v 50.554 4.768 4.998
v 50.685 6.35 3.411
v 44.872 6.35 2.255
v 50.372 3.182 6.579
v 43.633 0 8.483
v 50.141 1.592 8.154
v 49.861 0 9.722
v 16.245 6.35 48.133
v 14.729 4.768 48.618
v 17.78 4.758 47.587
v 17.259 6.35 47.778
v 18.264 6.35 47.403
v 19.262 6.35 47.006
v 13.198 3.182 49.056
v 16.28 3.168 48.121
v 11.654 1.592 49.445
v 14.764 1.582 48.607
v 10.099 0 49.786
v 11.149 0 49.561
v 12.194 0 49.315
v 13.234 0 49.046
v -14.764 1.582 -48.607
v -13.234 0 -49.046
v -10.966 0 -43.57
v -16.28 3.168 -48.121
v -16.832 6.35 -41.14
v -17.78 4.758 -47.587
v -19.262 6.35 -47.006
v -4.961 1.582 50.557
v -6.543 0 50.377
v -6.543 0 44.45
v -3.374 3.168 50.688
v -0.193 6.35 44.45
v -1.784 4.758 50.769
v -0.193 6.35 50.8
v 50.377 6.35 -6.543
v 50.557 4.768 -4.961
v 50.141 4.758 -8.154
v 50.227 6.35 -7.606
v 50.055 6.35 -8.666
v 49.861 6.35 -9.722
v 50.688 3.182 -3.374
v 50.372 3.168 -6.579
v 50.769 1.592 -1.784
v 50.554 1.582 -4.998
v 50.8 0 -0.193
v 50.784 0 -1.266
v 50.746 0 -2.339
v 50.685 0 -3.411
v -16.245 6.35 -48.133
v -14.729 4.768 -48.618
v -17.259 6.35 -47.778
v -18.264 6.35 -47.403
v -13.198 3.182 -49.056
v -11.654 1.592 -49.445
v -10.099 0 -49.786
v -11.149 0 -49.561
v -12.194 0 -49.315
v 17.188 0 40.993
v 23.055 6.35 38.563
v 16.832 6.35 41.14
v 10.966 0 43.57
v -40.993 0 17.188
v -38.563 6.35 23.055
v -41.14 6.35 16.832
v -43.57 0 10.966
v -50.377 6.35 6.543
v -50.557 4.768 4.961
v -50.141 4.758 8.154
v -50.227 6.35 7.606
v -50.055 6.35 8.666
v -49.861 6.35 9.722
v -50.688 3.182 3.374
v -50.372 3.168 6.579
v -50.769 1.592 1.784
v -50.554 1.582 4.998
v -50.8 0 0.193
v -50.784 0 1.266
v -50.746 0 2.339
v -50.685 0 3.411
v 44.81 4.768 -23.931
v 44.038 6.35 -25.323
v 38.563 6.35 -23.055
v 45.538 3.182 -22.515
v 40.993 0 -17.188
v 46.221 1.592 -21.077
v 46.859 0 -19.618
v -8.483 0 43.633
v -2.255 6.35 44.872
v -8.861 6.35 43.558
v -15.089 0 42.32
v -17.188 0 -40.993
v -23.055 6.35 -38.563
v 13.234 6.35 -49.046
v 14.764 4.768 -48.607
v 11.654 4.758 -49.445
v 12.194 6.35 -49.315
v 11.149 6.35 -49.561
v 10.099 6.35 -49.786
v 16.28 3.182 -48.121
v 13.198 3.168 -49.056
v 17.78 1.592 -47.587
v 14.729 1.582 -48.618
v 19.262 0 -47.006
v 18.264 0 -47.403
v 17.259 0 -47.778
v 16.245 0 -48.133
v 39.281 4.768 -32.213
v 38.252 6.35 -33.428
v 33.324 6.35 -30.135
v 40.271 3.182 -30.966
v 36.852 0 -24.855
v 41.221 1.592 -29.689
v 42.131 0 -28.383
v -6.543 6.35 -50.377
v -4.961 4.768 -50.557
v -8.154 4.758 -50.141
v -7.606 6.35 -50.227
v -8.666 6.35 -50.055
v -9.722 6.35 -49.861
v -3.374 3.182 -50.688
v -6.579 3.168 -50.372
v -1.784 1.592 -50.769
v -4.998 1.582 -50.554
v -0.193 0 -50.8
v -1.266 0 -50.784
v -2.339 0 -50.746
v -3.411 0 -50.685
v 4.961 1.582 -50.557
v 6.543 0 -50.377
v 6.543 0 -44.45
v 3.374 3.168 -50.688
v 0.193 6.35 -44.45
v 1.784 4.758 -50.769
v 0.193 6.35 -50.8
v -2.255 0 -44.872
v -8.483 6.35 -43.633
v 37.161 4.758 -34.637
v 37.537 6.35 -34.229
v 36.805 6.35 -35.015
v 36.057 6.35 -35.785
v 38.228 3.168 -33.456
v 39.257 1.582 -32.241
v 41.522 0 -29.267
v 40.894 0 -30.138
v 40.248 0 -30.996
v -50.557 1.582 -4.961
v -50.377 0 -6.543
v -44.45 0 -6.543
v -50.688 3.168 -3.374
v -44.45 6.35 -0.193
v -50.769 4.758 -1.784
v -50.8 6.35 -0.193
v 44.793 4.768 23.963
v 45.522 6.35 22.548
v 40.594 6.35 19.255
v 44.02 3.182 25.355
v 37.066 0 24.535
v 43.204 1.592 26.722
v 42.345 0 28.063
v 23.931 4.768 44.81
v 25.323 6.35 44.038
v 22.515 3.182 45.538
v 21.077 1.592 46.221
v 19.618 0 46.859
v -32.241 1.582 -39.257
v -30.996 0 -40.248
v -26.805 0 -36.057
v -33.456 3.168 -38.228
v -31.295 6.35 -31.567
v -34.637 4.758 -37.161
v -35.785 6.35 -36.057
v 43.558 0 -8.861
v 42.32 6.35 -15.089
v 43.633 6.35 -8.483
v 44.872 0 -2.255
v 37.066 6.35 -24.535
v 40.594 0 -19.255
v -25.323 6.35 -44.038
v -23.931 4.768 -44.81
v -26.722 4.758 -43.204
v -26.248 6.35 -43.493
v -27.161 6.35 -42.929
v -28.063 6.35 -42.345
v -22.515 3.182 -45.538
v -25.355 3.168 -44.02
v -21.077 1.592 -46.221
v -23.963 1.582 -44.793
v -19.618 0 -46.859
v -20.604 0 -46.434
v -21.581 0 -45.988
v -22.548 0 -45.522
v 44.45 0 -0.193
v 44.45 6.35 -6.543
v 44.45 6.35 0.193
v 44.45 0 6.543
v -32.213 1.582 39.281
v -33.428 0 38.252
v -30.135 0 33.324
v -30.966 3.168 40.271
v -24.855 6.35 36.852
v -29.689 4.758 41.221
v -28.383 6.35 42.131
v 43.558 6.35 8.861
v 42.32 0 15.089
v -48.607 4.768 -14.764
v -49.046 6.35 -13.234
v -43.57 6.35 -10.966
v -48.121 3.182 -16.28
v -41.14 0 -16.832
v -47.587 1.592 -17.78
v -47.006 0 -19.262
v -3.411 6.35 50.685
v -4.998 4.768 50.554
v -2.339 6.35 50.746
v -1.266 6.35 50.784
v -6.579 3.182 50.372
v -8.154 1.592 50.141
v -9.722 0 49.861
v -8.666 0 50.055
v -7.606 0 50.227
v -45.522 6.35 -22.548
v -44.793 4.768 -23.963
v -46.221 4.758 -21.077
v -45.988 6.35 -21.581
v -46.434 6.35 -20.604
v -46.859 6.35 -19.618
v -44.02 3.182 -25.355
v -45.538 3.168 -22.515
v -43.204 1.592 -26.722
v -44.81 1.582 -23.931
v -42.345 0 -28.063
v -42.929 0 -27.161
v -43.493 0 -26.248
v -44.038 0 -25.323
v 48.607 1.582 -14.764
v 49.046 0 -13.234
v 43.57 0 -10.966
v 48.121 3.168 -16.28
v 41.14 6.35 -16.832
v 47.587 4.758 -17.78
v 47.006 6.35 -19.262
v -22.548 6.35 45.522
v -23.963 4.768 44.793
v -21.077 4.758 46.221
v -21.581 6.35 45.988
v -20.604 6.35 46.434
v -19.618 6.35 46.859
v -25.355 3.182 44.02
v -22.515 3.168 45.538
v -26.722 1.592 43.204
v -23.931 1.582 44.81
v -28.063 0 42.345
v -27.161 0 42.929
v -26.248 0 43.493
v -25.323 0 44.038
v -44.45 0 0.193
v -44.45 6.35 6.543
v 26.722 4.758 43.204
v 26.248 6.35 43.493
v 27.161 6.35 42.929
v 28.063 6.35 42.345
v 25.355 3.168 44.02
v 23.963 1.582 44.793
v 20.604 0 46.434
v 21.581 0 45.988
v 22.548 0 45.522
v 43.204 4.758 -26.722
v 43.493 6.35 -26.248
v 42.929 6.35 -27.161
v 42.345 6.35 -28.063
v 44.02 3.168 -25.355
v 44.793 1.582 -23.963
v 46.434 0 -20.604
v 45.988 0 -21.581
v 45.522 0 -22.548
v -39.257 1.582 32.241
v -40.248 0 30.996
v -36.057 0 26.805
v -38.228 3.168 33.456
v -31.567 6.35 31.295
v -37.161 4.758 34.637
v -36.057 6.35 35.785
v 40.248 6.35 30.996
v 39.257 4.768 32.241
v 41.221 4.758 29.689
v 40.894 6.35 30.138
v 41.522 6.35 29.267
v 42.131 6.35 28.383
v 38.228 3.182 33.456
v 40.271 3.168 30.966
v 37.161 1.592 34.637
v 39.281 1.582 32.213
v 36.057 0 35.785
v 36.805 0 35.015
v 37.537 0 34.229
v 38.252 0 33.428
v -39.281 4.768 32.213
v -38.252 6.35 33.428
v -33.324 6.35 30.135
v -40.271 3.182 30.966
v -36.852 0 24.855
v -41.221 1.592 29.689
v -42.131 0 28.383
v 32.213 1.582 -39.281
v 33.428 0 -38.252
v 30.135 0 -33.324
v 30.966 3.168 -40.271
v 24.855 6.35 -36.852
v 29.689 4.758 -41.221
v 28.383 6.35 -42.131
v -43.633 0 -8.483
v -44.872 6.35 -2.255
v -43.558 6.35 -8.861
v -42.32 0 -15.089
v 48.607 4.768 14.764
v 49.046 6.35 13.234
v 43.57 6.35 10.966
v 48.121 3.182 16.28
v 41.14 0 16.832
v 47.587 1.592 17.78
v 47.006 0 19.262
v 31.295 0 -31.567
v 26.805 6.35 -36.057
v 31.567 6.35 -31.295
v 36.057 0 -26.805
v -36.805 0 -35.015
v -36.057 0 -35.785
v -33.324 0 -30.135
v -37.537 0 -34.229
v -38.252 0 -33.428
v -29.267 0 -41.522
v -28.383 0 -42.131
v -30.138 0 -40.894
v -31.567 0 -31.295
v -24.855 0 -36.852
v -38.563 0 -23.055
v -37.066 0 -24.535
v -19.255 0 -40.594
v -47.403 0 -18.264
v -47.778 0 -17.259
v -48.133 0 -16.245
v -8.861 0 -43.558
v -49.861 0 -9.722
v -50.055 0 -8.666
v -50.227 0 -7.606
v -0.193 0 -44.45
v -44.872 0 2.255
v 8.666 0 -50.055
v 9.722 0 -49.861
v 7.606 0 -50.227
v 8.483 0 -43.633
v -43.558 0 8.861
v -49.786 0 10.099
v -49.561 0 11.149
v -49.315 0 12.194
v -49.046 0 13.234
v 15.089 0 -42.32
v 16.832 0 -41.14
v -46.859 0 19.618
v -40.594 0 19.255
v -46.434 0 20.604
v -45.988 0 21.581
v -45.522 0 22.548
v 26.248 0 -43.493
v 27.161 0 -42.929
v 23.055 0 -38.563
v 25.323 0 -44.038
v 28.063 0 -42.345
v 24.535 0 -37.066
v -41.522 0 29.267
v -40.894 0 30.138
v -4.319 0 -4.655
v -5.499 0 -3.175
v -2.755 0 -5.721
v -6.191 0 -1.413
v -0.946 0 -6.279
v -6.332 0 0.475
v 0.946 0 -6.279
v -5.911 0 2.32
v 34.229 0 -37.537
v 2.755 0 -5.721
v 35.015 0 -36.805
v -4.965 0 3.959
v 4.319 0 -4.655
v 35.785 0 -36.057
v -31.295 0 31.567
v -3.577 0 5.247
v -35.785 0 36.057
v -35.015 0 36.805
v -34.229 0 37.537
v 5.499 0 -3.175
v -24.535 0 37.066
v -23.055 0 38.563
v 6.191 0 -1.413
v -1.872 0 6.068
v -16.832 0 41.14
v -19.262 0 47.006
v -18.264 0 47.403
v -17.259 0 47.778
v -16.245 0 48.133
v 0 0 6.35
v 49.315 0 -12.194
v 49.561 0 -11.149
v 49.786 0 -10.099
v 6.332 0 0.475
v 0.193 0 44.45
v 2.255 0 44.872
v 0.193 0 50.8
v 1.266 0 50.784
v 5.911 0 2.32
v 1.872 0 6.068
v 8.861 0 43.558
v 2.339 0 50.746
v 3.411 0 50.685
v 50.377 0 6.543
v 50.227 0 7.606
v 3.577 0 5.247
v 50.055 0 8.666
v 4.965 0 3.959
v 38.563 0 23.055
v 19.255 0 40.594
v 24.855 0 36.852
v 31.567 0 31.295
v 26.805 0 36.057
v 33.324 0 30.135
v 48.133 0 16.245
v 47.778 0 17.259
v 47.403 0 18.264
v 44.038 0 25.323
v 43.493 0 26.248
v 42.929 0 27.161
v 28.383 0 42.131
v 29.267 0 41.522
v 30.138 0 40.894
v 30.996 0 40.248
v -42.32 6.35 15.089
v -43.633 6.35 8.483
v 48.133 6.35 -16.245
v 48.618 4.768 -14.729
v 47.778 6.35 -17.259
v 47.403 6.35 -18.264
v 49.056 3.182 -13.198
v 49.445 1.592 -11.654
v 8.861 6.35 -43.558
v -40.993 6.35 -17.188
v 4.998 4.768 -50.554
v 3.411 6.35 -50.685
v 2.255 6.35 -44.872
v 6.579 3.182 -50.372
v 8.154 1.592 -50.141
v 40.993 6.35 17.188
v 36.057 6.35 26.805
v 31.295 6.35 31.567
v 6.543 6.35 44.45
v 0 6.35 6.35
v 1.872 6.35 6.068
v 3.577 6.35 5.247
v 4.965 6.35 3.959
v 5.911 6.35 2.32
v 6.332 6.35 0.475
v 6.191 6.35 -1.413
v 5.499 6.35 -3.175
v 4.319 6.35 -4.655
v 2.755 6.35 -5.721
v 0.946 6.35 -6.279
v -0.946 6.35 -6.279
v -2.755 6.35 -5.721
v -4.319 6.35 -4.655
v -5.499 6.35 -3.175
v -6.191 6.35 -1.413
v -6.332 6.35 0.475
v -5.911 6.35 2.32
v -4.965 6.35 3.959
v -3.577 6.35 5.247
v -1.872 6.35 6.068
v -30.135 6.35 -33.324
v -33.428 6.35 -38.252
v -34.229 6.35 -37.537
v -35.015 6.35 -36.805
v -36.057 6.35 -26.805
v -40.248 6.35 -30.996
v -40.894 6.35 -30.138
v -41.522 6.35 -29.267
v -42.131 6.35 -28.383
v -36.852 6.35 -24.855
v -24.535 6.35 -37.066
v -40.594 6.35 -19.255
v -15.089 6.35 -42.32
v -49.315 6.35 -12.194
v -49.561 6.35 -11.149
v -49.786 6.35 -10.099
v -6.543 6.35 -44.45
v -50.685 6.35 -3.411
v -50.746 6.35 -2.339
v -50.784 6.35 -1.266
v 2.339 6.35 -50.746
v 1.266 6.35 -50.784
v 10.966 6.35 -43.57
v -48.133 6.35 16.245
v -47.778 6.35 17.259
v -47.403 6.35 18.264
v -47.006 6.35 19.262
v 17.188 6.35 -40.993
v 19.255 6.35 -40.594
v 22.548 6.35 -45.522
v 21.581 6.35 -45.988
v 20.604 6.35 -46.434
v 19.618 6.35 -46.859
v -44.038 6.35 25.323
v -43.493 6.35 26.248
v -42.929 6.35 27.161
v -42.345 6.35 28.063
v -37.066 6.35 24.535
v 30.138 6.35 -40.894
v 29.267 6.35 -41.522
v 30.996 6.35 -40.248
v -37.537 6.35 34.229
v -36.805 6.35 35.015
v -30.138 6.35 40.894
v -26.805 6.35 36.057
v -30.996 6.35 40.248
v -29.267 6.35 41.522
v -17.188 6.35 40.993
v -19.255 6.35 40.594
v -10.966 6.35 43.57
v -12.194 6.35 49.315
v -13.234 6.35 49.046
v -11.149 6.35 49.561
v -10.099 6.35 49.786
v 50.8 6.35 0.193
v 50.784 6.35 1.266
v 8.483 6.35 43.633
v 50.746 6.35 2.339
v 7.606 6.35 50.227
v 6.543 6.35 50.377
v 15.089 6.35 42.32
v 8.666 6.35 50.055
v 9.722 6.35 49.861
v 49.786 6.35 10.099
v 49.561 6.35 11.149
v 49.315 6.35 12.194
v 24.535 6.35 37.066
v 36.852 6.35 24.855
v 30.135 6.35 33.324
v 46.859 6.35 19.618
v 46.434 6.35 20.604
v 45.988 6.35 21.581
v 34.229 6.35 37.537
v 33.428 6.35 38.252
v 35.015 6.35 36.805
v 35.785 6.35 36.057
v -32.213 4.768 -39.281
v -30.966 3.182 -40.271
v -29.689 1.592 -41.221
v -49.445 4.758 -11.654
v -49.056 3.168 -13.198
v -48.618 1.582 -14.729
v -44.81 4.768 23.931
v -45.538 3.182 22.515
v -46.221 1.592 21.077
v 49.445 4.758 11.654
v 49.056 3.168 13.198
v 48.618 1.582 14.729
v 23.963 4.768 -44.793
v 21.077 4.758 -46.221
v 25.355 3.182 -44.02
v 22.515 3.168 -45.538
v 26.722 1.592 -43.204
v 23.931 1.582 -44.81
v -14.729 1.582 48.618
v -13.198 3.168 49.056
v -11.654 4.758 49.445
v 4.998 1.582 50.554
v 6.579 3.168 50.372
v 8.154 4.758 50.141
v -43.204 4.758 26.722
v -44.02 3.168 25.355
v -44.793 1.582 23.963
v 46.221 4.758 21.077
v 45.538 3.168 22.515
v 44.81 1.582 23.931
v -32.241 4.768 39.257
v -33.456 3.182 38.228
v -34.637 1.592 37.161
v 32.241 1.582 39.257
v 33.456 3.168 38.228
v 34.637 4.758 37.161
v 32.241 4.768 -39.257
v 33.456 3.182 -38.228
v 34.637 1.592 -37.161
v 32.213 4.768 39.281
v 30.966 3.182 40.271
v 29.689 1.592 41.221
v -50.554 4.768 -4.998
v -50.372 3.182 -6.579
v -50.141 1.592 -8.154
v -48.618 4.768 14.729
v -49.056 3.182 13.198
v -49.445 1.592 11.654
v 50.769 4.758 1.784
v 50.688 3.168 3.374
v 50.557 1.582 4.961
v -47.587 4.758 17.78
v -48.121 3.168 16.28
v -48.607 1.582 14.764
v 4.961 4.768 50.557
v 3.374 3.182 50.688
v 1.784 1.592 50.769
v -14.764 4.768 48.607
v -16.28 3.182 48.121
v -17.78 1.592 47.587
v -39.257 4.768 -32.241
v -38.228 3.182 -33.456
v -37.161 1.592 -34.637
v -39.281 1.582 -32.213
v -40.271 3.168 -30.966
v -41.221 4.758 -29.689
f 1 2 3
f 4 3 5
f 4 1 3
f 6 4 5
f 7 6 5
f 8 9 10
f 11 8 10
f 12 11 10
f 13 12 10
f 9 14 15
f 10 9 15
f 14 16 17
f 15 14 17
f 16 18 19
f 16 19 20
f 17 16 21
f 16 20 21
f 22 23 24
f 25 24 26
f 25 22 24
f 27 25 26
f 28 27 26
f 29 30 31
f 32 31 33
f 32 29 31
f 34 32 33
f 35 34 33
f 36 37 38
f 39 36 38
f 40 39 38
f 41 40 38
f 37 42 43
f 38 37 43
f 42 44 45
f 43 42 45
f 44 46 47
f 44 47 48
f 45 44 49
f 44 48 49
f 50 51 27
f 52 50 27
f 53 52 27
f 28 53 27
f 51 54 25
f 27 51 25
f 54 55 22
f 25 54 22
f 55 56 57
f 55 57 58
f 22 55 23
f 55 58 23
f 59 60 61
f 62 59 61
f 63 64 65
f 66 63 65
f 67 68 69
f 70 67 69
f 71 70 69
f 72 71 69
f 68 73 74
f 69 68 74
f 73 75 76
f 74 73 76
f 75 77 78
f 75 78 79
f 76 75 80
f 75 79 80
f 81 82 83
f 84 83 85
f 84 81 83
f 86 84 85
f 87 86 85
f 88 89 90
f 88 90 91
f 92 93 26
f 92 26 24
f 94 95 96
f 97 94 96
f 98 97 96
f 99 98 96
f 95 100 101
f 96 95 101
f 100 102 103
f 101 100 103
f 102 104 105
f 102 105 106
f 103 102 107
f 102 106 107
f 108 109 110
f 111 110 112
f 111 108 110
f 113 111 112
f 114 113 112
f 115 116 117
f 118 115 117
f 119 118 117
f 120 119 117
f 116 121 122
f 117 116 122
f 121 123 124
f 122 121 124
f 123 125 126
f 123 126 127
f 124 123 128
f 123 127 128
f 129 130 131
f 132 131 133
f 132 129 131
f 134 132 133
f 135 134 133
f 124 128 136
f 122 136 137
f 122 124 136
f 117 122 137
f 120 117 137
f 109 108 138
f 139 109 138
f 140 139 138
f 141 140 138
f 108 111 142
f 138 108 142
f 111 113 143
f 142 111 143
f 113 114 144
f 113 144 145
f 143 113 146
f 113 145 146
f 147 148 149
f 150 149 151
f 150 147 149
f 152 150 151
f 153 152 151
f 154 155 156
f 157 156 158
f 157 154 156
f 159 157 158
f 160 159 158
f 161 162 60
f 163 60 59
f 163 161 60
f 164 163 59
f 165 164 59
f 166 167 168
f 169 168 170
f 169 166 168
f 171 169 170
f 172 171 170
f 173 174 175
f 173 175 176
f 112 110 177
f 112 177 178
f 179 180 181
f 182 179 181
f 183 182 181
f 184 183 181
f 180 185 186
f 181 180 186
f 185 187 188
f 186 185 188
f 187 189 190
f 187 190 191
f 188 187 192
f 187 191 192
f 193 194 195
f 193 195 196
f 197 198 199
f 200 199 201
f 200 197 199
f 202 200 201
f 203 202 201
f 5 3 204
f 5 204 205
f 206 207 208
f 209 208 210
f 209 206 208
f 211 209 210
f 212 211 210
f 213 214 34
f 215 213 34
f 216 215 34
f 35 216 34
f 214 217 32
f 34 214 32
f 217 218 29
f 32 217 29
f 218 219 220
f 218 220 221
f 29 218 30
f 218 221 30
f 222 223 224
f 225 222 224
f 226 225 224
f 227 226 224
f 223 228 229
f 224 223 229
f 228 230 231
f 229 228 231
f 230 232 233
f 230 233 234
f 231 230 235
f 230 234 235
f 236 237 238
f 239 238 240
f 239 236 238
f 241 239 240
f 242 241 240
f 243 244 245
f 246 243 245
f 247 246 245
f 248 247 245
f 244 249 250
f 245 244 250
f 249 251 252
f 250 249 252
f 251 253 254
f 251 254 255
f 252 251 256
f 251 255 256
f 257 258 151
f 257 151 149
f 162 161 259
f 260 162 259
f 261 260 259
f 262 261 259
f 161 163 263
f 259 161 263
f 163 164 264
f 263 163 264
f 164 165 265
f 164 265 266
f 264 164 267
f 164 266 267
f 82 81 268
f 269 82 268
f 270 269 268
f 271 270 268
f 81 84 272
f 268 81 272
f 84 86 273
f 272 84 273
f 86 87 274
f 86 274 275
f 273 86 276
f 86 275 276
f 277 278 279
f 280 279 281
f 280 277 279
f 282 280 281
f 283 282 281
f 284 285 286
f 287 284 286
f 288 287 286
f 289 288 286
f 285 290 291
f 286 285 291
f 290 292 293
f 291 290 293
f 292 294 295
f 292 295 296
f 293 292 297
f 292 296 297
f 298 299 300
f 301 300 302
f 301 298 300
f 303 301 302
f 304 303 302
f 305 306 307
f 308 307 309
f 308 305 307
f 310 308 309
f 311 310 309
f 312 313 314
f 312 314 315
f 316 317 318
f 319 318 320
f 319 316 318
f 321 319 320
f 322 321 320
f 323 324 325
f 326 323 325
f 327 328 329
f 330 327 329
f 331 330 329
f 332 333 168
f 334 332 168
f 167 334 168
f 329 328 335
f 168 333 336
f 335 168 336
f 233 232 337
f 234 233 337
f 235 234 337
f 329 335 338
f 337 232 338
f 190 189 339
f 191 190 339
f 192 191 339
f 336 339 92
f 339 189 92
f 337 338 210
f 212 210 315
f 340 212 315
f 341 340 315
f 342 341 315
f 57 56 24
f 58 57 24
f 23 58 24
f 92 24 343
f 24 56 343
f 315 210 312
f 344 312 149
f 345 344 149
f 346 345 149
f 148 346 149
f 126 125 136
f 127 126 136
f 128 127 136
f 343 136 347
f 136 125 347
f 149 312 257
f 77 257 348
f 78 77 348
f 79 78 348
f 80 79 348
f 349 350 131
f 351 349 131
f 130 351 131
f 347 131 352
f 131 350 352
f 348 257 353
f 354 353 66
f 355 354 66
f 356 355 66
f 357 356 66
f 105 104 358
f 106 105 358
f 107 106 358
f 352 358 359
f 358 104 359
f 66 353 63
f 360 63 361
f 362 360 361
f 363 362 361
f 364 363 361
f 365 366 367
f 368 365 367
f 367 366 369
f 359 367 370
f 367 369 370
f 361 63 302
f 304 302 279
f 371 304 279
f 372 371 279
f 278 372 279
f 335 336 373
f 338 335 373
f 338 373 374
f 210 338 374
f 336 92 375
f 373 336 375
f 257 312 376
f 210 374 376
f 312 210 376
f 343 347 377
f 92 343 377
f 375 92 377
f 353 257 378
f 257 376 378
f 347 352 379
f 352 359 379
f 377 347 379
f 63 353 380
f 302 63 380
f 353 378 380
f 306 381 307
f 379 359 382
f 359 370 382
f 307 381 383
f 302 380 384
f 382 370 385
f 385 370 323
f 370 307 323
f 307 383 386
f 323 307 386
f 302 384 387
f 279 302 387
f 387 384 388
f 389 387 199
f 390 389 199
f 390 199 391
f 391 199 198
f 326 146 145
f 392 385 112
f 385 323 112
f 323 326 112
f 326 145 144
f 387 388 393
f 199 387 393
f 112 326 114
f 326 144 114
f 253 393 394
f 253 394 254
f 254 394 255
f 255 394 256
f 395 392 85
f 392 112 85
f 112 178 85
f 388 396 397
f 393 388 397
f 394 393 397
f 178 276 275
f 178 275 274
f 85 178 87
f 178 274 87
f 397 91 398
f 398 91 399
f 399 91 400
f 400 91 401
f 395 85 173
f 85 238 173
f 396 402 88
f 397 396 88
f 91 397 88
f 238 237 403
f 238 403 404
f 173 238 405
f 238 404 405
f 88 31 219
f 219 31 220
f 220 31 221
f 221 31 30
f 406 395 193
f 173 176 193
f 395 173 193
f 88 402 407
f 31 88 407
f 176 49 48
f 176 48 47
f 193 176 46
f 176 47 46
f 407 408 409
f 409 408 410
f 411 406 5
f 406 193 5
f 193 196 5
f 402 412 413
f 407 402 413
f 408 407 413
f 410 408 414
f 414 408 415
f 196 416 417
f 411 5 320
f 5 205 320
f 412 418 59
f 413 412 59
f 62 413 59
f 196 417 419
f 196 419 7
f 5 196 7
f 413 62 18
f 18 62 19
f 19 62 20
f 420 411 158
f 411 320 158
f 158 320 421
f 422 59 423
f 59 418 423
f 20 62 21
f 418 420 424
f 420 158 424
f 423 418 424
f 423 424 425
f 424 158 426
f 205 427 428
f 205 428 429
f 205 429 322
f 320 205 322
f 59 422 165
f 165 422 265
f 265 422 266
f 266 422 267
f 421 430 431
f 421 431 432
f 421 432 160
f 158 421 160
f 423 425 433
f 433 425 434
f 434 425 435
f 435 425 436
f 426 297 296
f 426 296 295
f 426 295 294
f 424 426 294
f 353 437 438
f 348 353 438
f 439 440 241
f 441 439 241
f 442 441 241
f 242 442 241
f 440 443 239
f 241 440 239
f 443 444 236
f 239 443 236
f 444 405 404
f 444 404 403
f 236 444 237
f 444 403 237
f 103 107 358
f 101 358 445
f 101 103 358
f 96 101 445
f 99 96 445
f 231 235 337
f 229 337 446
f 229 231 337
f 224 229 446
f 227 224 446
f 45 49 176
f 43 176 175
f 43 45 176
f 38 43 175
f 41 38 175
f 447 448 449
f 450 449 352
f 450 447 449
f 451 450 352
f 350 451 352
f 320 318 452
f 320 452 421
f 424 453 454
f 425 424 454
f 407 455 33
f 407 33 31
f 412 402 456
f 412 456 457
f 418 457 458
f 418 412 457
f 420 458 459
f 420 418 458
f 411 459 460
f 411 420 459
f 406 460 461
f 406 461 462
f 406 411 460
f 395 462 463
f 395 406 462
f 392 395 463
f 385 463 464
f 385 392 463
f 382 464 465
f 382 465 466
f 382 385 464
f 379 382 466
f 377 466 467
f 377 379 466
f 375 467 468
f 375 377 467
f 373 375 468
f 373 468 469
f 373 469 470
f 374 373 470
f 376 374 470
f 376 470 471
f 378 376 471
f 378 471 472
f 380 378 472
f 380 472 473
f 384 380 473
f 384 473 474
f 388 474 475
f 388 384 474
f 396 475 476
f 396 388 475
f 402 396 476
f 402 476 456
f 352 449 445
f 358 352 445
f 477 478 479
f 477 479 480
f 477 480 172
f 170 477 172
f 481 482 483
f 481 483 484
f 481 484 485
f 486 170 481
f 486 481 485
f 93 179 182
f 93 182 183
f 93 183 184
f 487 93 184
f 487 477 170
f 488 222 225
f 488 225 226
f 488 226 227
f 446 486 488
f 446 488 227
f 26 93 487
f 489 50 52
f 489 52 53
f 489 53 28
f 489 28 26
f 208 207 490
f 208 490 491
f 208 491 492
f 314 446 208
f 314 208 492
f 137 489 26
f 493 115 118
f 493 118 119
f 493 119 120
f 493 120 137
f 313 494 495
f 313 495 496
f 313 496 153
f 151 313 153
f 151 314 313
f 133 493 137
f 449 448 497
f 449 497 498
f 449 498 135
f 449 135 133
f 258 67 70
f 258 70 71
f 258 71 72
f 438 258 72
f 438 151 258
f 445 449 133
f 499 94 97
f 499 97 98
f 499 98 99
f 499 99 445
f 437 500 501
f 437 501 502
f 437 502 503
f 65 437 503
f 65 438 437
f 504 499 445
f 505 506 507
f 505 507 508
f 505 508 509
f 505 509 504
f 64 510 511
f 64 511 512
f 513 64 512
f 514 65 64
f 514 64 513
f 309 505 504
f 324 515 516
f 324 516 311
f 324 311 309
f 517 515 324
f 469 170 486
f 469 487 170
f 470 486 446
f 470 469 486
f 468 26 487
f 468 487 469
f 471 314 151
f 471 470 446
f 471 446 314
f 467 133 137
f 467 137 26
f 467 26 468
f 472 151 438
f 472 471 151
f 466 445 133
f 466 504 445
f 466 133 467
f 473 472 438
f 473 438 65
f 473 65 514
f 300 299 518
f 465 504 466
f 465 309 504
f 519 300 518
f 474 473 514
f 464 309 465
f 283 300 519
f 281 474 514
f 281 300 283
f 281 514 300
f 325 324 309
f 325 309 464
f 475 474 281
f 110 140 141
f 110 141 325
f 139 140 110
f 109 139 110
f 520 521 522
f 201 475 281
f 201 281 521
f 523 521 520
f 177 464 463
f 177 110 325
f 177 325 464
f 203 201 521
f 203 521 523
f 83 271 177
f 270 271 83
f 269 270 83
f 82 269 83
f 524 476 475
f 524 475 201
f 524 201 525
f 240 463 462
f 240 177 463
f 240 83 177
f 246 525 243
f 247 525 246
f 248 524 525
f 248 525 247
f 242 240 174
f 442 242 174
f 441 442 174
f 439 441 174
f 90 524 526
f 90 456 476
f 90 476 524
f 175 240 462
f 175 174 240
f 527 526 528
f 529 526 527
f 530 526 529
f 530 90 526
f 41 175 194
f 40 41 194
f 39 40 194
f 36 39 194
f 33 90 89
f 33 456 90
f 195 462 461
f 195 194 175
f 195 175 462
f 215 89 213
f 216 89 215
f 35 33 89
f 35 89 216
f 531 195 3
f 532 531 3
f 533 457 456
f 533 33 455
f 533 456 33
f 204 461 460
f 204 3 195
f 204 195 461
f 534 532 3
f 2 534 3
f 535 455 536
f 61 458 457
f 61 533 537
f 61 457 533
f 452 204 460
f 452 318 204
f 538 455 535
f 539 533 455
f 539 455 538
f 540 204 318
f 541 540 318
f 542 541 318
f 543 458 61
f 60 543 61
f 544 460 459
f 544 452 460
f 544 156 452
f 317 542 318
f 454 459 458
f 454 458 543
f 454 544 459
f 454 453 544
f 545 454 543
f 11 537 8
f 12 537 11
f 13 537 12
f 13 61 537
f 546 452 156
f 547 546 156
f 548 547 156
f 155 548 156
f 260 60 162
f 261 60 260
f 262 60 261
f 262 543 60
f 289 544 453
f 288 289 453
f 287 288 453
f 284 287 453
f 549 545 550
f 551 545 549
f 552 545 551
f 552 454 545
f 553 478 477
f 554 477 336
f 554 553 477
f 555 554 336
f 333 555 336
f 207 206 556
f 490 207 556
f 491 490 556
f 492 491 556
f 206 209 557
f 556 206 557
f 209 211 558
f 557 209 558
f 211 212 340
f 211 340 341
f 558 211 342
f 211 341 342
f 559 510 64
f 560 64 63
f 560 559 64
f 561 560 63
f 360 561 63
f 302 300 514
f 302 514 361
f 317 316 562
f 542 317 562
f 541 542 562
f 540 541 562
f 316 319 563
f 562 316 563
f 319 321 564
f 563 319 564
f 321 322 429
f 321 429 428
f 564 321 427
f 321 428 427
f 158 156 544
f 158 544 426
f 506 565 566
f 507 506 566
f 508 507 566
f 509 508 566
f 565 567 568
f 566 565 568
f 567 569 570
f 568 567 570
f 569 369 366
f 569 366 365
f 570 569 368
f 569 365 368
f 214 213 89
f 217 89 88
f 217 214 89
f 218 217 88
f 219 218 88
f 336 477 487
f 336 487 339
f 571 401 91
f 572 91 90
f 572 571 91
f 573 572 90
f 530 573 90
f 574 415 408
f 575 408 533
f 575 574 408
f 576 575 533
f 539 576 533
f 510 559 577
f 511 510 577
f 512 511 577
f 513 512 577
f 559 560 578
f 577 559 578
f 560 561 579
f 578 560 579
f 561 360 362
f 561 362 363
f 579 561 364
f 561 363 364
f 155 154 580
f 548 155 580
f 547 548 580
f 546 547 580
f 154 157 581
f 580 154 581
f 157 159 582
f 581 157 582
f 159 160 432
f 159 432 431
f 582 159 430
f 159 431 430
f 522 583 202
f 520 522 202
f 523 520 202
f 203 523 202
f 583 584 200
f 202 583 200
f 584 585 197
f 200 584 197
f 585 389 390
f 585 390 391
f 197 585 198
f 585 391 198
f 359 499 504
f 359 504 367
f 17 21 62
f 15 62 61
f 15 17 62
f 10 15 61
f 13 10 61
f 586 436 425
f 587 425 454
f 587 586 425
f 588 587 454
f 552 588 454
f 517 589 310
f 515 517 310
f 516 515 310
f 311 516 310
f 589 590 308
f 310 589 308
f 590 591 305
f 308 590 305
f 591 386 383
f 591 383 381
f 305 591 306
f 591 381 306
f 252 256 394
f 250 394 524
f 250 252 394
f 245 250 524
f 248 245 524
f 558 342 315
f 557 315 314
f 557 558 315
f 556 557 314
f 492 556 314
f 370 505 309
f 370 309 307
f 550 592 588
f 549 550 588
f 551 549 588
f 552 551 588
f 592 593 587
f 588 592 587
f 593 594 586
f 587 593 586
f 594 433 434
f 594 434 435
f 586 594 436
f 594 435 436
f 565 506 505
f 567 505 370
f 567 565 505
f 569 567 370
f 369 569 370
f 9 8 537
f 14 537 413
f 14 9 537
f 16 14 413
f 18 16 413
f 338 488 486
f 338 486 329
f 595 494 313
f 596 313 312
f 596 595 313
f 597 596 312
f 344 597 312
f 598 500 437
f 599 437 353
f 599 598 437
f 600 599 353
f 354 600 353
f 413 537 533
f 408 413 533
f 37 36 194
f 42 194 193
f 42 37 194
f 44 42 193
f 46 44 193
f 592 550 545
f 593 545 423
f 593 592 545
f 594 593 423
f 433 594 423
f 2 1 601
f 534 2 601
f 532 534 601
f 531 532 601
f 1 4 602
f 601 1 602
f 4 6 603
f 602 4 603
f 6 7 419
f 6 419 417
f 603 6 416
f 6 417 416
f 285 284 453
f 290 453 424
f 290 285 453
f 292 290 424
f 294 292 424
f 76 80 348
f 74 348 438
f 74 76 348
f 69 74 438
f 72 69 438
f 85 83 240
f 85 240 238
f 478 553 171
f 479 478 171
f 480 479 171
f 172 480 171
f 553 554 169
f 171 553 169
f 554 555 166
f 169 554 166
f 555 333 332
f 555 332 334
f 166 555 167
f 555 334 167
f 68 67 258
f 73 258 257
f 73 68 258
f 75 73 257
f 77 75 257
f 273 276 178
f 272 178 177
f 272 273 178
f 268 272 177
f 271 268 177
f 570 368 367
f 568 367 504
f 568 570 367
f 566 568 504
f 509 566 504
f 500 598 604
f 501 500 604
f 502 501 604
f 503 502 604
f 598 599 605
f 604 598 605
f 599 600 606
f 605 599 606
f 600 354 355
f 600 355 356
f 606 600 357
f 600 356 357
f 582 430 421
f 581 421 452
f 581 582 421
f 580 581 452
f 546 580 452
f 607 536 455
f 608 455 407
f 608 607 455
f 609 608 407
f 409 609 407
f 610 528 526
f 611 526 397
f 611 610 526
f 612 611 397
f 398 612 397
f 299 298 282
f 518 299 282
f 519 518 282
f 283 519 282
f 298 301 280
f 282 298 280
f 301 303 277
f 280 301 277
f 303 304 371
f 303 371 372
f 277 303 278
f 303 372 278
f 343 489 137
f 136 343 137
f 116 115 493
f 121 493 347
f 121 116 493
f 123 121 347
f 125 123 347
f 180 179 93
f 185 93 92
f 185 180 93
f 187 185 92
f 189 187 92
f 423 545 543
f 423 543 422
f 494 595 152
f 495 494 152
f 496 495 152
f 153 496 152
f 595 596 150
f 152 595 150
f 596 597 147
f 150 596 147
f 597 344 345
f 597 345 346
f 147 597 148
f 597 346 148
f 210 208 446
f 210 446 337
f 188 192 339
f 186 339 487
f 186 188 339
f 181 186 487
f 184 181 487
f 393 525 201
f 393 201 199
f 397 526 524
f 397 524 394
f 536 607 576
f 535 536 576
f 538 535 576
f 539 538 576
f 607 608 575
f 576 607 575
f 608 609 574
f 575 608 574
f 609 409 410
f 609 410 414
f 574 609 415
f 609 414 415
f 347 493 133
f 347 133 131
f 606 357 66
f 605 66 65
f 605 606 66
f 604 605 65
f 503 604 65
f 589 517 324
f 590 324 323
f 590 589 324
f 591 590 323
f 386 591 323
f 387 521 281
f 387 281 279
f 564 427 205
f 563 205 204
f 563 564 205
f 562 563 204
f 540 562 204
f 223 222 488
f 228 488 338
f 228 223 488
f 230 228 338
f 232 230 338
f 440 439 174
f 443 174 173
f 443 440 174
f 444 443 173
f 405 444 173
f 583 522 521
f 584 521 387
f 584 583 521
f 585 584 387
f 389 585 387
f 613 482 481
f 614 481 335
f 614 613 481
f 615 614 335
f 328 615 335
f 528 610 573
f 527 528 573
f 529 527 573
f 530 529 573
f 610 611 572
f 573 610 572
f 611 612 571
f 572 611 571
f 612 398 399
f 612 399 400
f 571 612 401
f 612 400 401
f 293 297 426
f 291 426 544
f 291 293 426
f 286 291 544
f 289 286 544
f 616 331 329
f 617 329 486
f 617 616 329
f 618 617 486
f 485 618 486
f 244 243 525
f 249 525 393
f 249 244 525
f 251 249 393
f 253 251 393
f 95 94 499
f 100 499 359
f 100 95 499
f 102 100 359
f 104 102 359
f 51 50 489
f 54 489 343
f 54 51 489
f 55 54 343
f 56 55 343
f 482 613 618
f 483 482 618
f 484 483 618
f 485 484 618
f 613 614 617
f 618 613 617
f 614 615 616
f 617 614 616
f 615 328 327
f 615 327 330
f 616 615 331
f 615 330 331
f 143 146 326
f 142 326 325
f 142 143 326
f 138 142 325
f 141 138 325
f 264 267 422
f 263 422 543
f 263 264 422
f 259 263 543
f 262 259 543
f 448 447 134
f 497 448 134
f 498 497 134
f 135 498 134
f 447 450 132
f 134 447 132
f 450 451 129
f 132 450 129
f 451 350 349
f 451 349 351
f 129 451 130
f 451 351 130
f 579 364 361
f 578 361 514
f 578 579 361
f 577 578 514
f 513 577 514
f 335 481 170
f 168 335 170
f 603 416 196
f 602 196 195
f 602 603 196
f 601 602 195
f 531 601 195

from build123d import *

# Parameters (mm, degrees)
SKETCH1_R           = 50.8
SKETCH1_R_2         = 6.35
BOSS_EXTRUDE1_DEPTH = 6.35
CUT_EXTRUDE1_DEPTH  = 6.35
CIRPATTERN1_COUNT   = 32


with BuildPart() as part:
    # Sketch1 → Boss-Extrude1 (new body)
    with BuildSketch(Plane(origin=(0, 0, 0), x_dir=(1, 0, 0), z_dir=(0, 1, 0))):
        with Locations(Location((0, 0, 0), (0, 0, 270))):
            Circle(SKETCH1_R)
        with Locations(Location((0, 0, 0), (0, 0, 270))):
            Circle(SKETCH1_R_2, mode=Mode.SUBTRACT)
    extrude(amount=BOSS_EXTRUDE1_DEPTH)

    # Sketch2 → Cut-Extrude1 (cut)
    with BuildSketch(Plane.XY.offset(50.8)):
        Polygon((15.154182204, 14.961586159), (-11.786586159, -11.979182204), (-15.154182204, -8.611586159), (11.786586159, 18.329182204), align=None)
    cut_extrude1 = extrude(amount=-CUT_EXTRUDE1_DEPTH, mode=Mode.SUBTRACT)

    # CirPattern1: Cut-Extrude1 ×32 about axis
    cirpattern1_axis = Axis((0, 0, 0), (0, 1, 0))
    for i in range(1, CIRPATTERN1_COUNT):
        add(cut_extrude1.rotate(cirpattern1_axis, i * 360 / CIRPATTERN1_COUNT), mode=Mode.SUBTRACT)


solid = part.part
